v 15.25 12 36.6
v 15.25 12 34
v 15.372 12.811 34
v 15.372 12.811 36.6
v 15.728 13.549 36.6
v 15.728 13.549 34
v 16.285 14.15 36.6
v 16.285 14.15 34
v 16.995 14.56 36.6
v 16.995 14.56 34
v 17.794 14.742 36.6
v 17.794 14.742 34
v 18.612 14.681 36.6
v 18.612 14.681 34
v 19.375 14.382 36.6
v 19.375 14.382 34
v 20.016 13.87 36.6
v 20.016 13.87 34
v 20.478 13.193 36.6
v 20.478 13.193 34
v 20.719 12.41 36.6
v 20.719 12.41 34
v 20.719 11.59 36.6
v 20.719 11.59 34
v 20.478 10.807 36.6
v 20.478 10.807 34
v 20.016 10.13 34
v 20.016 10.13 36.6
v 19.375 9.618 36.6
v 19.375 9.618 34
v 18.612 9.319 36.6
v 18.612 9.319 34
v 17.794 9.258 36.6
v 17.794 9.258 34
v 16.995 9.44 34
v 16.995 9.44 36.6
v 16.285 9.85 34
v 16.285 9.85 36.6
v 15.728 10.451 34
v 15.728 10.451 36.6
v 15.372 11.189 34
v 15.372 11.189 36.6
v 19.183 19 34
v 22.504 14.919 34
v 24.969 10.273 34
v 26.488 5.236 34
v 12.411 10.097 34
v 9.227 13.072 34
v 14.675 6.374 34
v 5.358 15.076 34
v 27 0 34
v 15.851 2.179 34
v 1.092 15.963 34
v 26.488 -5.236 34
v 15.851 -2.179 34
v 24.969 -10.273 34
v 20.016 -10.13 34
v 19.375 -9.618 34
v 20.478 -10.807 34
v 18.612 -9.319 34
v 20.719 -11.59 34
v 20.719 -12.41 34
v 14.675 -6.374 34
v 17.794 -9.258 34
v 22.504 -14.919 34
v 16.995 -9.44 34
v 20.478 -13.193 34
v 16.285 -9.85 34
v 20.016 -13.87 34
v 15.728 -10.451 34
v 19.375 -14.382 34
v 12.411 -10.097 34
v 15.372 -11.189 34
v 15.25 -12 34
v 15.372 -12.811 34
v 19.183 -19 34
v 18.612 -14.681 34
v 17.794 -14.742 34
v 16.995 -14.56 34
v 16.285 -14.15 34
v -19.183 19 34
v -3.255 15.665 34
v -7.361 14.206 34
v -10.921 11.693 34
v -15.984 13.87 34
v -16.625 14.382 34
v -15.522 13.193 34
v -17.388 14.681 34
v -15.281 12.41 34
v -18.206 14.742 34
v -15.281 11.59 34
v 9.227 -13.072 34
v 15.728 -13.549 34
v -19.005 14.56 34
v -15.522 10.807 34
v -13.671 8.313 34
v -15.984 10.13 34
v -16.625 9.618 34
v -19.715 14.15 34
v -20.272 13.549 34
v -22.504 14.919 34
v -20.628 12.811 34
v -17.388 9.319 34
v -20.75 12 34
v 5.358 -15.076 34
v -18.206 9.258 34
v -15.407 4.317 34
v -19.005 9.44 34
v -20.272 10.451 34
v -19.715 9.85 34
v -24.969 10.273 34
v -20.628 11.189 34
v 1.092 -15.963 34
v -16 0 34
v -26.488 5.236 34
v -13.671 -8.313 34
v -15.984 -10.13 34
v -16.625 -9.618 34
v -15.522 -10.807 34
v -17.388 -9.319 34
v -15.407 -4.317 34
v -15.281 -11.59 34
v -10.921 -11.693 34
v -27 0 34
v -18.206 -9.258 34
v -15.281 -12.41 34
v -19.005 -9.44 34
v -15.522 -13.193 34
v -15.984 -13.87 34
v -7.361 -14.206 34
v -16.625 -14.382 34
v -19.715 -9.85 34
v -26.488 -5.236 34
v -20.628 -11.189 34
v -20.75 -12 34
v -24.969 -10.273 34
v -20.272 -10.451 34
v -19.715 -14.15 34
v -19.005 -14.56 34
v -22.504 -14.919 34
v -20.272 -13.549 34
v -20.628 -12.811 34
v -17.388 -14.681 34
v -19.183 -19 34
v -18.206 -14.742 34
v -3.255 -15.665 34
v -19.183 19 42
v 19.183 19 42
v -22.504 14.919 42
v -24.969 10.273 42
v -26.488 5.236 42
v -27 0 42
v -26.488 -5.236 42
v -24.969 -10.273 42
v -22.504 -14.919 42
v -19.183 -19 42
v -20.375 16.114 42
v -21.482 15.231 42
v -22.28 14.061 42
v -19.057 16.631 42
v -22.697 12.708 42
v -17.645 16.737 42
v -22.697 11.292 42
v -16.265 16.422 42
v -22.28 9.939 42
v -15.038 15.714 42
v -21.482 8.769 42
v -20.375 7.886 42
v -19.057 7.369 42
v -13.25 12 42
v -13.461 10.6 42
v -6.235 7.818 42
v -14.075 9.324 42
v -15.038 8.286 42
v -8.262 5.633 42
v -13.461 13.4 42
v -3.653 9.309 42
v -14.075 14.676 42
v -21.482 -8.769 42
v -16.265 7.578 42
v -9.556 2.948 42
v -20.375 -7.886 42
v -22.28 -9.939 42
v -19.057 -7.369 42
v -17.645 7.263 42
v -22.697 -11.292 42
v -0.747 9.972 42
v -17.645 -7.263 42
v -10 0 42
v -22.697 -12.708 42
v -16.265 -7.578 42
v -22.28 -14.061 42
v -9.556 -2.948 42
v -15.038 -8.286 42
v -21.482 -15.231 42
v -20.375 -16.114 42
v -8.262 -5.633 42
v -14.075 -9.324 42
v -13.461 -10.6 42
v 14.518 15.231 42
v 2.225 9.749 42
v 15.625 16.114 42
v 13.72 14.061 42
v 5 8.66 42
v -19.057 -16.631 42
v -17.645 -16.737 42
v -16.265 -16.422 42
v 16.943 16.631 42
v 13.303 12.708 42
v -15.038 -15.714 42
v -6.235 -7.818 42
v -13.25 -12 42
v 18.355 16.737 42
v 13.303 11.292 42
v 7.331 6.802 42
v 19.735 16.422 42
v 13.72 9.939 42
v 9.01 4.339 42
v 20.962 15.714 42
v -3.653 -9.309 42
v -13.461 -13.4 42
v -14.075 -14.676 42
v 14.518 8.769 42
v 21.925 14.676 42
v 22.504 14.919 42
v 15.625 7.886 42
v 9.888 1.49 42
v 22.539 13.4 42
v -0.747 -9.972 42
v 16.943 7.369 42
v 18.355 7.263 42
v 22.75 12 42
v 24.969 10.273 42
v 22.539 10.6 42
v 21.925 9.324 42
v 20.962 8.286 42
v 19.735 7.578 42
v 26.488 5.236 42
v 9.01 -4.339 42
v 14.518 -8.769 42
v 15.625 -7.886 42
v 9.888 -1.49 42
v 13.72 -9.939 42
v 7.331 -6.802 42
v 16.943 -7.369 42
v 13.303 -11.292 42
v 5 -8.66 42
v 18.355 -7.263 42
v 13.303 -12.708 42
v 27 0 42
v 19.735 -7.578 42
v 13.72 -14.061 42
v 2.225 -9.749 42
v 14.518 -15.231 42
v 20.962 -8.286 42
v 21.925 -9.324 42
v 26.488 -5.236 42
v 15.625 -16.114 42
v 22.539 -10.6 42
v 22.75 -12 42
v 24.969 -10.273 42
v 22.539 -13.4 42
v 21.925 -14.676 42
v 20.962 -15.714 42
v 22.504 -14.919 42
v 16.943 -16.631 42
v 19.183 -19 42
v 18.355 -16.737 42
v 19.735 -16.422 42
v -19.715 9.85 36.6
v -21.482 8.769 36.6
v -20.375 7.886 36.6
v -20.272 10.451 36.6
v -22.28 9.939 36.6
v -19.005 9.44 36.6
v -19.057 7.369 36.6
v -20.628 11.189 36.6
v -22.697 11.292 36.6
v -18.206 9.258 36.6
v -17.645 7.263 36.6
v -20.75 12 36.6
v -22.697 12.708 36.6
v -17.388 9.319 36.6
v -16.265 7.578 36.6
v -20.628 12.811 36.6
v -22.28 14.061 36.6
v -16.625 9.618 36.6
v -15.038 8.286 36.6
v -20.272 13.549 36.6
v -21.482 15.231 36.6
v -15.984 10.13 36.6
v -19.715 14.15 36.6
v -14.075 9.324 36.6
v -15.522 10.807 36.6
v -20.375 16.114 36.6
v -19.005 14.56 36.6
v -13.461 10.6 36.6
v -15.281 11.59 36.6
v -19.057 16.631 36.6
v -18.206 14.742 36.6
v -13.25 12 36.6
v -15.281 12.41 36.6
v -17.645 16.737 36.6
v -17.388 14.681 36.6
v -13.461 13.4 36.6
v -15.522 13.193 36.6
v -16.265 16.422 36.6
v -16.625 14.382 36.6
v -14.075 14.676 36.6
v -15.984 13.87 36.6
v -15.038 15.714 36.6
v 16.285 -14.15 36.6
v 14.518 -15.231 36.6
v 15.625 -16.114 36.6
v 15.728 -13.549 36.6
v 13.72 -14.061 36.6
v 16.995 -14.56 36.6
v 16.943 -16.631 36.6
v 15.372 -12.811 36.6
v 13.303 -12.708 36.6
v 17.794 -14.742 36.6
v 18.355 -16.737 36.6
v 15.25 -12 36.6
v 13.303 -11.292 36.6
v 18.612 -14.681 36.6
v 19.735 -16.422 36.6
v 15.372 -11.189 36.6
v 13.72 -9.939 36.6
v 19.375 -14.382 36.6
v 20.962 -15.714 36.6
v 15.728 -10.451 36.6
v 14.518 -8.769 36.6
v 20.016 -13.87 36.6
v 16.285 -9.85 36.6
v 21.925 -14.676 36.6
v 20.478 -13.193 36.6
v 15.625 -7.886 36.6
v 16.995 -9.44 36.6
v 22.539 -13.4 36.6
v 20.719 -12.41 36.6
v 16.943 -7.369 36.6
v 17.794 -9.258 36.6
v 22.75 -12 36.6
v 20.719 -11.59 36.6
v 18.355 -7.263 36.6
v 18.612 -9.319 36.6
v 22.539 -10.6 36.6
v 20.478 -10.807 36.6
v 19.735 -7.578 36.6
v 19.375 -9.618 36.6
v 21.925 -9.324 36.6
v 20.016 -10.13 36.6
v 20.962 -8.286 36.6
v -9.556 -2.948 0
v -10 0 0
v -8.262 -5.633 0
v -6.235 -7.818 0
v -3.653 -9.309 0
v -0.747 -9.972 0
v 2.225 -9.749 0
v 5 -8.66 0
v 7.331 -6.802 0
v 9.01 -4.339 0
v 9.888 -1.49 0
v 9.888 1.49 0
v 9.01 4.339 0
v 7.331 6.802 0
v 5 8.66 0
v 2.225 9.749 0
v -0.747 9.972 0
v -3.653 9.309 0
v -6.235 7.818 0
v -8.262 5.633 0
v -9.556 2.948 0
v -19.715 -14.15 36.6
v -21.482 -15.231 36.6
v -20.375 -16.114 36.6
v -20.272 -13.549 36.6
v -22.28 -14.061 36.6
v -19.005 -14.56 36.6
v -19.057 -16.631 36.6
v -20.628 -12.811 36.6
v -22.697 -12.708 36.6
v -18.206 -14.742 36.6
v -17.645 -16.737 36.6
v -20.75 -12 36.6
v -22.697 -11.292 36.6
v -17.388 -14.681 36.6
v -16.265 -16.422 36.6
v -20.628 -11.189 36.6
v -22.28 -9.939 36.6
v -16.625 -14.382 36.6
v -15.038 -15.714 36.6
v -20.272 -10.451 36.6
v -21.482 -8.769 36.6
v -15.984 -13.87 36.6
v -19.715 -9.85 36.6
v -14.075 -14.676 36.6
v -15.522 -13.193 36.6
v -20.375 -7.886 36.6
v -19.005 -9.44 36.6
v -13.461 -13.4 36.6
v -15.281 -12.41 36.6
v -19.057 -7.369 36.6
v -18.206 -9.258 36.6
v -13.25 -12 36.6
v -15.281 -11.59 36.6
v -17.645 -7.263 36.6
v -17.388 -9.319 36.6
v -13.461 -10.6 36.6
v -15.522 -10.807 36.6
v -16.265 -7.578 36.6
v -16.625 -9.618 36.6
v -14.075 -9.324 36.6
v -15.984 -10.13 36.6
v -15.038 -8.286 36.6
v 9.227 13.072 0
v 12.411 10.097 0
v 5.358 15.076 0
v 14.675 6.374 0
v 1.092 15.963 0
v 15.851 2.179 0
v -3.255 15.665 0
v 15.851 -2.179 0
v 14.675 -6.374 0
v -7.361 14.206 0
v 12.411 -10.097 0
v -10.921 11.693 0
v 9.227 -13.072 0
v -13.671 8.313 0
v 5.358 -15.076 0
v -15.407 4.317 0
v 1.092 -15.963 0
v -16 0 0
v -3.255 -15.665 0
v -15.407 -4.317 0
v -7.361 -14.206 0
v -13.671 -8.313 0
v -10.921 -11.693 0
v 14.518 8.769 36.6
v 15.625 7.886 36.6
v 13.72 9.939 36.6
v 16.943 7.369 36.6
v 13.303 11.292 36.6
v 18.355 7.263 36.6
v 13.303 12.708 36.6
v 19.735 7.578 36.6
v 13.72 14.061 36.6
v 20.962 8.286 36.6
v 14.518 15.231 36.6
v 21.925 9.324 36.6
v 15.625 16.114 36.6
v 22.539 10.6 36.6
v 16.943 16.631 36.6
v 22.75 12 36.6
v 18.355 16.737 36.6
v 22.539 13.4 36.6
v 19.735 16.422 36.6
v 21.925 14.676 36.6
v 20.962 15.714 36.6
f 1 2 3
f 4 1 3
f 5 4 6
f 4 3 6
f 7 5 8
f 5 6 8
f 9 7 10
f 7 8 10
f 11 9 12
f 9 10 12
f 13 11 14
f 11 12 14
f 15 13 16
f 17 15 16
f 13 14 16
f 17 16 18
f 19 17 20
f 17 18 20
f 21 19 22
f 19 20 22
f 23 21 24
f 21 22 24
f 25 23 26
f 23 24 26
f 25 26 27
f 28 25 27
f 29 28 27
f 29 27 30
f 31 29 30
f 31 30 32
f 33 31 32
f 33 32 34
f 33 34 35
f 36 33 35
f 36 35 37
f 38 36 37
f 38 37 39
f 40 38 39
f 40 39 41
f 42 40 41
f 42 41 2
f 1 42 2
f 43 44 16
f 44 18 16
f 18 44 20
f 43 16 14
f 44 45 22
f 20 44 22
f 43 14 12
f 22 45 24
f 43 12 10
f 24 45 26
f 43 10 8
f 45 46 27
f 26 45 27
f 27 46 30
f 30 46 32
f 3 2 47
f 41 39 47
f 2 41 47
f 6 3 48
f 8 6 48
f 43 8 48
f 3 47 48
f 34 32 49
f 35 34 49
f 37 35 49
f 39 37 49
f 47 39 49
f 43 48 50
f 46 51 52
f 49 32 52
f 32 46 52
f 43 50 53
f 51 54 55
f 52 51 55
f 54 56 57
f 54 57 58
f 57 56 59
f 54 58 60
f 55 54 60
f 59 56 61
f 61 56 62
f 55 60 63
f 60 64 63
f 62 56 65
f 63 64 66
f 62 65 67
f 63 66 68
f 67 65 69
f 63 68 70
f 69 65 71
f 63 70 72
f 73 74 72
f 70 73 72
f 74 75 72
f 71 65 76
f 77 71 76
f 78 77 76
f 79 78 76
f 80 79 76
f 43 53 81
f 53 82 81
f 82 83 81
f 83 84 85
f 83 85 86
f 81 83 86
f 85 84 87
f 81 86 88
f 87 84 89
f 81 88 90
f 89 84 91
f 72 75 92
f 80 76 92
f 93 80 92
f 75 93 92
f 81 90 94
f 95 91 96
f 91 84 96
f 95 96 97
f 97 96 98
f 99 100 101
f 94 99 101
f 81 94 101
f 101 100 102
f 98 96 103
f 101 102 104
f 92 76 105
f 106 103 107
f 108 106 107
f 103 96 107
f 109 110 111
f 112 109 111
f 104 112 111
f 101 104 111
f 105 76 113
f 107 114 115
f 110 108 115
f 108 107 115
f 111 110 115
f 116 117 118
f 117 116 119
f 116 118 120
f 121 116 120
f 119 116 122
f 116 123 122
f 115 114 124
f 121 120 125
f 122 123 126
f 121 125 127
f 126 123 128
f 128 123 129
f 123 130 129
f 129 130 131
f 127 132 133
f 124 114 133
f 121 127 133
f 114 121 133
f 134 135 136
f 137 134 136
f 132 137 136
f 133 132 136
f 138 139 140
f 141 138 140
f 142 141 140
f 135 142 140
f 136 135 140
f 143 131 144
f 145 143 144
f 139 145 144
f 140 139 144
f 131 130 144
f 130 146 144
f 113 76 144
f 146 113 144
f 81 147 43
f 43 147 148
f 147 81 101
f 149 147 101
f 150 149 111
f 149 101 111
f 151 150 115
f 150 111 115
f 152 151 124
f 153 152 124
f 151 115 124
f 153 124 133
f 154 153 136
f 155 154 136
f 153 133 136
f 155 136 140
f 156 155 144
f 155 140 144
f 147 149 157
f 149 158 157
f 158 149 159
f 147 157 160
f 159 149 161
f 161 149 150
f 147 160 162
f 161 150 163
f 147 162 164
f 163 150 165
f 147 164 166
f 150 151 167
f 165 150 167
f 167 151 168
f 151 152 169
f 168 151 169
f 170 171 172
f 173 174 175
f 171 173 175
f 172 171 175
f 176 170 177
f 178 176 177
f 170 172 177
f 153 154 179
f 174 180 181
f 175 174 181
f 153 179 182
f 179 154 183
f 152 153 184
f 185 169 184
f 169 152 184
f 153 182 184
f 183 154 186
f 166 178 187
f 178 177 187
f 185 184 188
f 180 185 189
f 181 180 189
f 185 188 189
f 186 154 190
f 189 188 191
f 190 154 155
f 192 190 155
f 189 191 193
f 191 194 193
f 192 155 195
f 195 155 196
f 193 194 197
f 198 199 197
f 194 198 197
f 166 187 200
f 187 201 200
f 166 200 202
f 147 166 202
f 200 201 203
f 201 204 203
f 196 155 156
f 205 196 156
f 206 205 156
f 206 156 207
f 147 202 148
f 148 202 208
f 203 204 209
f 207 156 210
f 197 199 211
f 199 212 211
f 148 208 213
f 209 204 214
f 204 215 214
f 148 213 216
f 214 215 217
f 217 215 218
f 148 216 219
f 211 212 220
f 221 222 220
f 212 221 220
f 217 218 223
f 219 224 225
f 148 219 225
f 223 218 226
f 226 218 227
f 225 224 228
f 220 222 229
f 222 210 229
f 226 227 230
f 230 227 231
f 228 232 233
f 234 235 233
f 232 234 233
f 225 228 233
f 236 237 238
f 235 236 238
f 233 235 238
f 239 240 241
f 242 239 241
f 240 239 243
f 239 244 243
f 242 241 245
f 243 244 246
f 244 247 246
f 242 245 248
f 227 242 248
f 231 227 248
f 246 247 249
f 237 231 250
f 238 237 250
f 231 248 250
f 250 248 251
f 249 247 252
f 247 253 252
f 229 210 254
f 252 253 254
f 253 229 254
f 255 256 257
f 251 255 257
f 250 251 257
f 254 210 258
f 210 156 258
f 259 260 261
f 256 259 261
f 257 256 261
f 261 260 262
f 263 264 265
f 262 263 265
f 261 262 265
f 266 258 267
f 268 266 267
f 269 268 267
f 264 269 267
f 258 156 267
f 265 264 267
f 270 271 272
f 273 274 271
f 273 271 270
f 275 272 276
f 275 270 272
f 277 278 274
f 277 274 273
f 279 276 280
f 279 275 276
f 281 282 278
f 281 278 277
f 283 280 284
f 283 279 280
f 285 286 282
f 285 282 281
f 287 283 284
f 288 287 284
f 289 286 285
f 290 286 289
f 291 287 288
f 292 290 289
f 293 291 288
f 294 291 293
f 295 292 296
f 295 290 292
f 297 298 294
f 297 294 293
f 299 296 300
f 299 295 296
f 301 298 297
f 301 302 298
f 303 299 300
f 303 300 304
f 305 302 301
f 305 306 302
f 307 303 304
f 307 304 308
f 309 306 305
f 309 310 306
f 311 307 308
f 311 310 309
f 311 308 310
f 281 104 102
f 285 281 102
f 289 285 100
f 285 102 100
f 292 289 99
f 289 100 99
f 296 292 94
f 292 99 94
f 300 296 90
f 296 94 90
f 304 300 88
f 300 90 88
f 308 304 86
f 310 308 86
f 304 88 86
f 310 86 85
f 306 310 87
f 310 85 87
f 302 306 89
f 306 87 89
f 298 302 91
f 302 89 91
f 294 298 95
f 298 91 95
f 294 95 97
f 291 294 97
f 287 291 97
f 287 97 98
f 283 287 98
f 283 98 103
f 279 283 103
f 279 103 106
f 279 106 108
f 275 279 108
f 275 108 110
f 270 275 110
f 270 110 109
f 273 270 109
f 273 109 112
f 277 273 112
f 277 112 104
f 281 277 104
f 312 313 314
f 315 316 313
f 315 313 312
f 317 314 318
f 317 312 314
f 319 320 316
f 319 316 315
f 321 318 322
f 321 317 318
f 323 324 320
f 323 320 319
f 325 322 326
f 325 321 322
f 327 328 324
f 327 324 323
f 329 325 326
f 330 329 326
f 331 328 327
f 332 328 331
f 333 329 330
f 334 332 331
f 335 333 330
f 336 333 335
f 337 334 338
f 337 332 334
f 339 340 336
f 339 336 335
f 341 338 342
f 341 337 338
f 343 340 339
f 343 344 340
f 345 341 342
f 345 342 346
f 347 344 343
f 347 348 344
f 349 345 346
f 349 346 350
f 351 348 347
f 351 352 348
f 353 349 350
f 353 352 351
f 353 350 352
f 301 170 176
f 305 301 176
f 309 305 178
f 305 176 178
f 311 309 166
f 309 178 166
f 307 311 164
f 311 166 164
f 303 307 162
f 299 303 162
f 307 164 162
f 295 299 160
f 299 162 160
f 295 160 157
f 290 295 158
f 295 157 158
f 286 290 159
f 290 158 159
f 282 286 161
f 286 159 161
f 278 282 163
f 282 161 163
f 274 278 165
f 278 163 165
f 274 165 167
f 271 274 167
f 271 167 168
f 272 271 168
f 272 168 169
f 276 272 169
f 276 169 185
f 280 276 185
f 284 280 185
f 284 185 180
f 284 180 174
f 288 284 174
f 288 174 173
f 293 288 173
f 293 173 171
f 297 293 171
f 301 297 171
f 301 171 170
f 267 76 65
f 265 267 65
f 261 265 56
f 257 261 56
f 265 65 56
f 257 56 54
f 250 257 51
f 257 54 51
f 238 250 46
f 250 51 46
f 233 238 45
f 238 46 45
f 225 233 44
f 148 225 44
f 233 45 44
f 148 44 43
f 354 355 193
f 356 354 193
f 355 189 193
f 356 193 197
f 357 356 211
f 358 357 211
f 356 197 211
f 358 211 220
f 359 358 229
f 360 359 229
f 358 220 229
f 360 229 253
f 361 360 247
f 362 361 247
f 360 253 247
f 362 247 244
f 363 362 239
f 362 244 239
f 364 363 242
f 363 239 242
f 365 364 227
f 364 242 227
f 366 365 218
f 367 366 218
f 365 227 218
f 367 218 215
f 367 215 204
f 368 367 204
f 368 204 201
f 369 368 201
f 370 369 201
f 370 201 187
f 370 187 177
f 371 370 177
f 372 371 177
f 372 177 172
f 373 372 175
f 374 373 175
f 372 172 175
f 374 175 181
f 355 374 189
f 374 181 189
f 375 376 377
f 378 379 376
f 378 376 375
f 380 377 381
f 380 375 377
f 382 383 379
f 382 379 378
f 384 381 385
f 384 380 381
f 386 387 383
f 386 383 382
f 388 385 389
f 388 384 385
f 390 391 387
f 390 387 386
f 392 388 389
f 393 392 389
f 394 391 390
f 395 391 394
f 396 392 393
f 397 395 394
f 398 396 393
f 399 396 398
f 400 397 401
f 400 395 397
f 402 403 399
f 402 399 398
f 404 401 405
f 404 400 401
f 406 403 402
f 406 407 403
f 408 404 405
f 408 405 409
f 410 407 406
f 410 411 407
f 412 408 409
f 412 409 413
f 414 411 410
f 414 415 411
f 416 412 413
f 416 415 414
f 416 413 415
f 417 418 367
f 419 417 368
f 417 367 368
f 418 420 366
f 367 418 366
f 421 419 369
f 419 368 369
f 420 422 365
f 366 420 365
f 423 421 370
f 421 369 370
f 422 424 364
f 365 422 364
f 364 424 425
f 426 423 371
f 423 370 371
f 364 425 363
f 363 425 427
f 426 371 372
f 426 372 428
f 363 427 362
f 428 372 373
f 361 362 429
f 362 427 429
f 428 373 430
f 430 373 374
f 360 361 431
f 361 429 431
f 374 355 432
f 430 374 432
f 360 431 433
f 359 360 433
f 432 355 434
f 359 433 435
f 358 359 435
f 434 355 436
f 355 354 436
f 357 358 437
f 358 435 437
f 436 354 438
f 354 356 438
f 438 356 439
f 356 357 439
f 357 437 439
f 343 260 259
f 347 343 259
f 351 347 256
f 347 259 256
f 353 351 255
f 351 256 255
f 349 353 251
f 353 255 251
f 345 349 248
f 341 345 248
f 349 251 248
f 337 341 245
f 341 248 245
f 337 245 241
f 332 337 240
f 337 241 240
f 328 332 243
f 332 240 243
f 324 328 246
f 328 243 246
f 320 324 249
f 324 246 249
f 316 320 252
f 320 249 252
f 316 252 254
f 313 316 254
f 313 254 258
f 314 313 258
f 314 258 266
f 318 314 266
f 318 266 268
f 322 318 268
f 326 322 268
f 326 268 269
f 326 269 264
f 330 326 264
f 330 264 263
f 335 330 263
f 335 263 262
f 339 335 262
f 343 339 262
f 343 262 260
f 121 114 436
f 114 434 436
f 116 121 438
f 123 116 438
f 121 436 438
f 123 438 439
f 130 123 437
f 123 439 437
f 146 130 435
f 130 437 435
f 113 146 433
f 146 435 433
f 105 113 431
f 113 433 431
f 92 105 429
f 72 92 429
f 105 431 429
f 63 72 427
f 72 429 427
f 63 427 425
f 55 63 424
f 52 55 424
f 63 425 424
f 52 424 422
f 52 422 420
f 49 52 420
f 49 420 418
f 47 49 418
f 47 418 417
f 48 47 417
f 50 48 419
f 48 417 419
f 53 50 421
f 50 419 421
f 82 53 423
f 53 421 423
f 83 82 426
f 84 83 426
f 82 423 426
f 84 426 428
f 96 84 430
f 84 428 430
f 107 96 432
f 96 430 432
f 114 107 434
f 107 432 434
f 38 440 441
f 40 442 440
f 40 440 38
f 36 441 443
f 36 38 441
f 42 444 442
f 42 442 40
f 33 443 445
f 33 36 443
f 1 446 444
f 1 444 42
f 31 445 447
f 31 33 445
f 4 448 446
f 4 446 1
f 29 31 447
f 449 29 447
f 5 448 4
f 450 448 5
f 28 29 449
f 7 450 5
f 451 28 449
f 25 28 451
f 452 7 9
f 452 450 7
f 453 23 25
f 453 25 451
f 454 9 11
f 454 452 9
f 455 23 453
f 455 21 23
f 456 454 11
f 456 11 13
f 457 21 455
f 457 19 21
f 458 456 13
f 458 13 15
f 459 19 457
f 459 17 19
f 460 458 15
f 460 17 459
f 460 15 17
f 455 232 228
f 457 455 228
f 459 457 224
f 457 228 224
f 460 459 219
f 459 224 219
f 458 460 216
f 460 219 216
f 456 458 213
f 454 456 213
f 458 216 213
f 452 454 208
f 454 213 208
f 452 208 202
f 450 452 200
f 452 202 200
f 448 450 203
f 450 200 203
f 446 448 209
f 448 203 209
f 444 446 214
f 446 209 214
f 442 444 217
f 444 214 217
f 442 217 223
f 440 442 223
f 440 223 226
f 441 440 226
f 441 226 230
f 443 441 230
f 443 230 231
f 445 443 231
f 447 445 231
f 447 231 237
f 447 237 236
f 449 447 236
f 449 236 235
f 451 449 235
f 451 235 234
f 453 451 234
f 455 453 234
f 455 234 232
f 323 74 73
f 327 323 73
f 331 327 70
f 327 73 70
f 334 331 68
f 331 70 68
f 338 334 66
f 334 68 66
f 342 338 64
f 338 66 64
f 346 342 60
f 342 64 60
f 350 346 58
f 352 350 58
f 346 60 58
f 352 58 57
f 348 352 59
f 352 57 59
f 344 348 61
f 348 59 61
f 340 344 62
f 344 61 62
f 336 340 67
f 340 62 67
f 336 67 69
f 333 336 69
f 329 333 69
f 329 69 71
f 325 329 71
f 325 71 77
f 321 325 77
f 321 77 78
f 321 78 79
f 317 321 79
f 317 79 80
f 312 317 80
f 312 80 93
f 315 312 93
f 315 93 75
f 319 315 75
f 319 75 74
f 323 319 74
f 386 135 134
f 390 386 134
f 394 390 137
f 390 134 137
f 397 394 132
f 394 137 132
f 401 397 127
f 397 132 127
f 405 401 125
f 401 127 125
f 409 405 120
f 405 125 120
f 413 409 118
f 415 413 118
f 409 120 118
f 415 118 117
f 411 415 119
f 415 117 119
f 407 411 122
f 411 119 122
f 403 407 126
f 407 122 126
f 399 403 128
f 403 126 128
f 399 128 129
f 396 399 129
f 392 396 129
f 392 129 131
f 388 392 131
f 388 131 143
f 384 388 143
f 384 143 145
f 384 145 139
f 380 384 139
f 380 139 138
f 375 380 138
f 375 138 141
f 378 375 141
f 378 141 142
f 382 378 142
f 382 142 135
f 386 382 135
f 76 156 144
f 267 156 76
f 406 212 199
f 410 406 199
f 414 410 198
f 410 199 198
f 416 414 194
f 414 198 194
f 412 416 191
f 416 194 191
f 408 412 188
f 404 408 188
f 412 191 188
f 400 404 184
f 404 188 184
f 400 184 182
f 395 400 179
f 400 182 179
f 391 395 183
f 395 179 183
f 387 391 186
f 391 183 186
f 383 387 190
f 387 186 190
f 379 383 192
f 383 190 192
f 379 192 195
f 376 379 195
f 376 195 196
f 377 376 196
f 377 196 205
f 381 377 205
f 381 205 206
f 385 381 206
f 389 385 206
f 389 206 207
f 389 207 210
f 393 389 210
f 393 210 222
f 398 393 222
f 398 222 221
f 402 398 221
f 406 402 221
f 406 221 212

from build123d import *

# Parameters (mm, degrees)
SKETCH_2_OUTSIDE_W        = 73.432
SKETCH_2_OUTSIDE_H        = 73.432
SKETCH_2_OUTSIDE_W_2      = 54
SKETCH_2_OUTSIDE_H_2      = 38
CUT_EXTRUDE_1_DEPTH       = 8
HOLE_WIZARD_1_D           = 5.5
HOLE_WIZARD_1_DEPTH       = 8
HOLE_WIZARD_1_CBORE_D     = 9.5
HOLE_WIZARD_1_CBORE_DEPTH = 5.4


with BuildPart() as part:
    # 草图1 → 旋转1 (revolve)
    with BuildSketch(Plane(origin=(0, 0, 0), x_dir=(0, 0, 1), z_dir=(0, -1, 0))):
        Polygon((0, 10), (42, 10), (42, 27), (34, 27), (34, 16), (0, 16), align=None)
    revolve(axis=Axis((0, 0, 0), (0, 0, 1)))

    # 草图2 outside → 切除-拉伸1 (cut)
    with BuildSketch(Plane.XY.offset(42)):
        Rectangle(SKETCH_2_OUTSIDE_W, SKETCH_2_OUTSIDE_H)
        Rectangle(SKETCH_2_OUTSIDE_W_2, SKETCH_2_OUTSIDE_H_2, mode=Mode.SUBTRACT)
    extrude(amount=-CUT_EXTRUDE_1_DEPTH, mode=Mode.SUBTRACT)

    # 孔1
    with Locations(Plane.XY.offset(42)):
        with Locations((-18, -12), (-18, 12), (18, 12), (18, -12), (0, 0)):
            CounterBoreHole(HOLE_WIZARD_1_D / 2, HOLE_WIZARD_1_CBORE_D / 2, HOLE_WIZARD_1_CBORE_DEPTH, depth=HOLE_WIZARD_1_DEPTH)


solid = part.part
